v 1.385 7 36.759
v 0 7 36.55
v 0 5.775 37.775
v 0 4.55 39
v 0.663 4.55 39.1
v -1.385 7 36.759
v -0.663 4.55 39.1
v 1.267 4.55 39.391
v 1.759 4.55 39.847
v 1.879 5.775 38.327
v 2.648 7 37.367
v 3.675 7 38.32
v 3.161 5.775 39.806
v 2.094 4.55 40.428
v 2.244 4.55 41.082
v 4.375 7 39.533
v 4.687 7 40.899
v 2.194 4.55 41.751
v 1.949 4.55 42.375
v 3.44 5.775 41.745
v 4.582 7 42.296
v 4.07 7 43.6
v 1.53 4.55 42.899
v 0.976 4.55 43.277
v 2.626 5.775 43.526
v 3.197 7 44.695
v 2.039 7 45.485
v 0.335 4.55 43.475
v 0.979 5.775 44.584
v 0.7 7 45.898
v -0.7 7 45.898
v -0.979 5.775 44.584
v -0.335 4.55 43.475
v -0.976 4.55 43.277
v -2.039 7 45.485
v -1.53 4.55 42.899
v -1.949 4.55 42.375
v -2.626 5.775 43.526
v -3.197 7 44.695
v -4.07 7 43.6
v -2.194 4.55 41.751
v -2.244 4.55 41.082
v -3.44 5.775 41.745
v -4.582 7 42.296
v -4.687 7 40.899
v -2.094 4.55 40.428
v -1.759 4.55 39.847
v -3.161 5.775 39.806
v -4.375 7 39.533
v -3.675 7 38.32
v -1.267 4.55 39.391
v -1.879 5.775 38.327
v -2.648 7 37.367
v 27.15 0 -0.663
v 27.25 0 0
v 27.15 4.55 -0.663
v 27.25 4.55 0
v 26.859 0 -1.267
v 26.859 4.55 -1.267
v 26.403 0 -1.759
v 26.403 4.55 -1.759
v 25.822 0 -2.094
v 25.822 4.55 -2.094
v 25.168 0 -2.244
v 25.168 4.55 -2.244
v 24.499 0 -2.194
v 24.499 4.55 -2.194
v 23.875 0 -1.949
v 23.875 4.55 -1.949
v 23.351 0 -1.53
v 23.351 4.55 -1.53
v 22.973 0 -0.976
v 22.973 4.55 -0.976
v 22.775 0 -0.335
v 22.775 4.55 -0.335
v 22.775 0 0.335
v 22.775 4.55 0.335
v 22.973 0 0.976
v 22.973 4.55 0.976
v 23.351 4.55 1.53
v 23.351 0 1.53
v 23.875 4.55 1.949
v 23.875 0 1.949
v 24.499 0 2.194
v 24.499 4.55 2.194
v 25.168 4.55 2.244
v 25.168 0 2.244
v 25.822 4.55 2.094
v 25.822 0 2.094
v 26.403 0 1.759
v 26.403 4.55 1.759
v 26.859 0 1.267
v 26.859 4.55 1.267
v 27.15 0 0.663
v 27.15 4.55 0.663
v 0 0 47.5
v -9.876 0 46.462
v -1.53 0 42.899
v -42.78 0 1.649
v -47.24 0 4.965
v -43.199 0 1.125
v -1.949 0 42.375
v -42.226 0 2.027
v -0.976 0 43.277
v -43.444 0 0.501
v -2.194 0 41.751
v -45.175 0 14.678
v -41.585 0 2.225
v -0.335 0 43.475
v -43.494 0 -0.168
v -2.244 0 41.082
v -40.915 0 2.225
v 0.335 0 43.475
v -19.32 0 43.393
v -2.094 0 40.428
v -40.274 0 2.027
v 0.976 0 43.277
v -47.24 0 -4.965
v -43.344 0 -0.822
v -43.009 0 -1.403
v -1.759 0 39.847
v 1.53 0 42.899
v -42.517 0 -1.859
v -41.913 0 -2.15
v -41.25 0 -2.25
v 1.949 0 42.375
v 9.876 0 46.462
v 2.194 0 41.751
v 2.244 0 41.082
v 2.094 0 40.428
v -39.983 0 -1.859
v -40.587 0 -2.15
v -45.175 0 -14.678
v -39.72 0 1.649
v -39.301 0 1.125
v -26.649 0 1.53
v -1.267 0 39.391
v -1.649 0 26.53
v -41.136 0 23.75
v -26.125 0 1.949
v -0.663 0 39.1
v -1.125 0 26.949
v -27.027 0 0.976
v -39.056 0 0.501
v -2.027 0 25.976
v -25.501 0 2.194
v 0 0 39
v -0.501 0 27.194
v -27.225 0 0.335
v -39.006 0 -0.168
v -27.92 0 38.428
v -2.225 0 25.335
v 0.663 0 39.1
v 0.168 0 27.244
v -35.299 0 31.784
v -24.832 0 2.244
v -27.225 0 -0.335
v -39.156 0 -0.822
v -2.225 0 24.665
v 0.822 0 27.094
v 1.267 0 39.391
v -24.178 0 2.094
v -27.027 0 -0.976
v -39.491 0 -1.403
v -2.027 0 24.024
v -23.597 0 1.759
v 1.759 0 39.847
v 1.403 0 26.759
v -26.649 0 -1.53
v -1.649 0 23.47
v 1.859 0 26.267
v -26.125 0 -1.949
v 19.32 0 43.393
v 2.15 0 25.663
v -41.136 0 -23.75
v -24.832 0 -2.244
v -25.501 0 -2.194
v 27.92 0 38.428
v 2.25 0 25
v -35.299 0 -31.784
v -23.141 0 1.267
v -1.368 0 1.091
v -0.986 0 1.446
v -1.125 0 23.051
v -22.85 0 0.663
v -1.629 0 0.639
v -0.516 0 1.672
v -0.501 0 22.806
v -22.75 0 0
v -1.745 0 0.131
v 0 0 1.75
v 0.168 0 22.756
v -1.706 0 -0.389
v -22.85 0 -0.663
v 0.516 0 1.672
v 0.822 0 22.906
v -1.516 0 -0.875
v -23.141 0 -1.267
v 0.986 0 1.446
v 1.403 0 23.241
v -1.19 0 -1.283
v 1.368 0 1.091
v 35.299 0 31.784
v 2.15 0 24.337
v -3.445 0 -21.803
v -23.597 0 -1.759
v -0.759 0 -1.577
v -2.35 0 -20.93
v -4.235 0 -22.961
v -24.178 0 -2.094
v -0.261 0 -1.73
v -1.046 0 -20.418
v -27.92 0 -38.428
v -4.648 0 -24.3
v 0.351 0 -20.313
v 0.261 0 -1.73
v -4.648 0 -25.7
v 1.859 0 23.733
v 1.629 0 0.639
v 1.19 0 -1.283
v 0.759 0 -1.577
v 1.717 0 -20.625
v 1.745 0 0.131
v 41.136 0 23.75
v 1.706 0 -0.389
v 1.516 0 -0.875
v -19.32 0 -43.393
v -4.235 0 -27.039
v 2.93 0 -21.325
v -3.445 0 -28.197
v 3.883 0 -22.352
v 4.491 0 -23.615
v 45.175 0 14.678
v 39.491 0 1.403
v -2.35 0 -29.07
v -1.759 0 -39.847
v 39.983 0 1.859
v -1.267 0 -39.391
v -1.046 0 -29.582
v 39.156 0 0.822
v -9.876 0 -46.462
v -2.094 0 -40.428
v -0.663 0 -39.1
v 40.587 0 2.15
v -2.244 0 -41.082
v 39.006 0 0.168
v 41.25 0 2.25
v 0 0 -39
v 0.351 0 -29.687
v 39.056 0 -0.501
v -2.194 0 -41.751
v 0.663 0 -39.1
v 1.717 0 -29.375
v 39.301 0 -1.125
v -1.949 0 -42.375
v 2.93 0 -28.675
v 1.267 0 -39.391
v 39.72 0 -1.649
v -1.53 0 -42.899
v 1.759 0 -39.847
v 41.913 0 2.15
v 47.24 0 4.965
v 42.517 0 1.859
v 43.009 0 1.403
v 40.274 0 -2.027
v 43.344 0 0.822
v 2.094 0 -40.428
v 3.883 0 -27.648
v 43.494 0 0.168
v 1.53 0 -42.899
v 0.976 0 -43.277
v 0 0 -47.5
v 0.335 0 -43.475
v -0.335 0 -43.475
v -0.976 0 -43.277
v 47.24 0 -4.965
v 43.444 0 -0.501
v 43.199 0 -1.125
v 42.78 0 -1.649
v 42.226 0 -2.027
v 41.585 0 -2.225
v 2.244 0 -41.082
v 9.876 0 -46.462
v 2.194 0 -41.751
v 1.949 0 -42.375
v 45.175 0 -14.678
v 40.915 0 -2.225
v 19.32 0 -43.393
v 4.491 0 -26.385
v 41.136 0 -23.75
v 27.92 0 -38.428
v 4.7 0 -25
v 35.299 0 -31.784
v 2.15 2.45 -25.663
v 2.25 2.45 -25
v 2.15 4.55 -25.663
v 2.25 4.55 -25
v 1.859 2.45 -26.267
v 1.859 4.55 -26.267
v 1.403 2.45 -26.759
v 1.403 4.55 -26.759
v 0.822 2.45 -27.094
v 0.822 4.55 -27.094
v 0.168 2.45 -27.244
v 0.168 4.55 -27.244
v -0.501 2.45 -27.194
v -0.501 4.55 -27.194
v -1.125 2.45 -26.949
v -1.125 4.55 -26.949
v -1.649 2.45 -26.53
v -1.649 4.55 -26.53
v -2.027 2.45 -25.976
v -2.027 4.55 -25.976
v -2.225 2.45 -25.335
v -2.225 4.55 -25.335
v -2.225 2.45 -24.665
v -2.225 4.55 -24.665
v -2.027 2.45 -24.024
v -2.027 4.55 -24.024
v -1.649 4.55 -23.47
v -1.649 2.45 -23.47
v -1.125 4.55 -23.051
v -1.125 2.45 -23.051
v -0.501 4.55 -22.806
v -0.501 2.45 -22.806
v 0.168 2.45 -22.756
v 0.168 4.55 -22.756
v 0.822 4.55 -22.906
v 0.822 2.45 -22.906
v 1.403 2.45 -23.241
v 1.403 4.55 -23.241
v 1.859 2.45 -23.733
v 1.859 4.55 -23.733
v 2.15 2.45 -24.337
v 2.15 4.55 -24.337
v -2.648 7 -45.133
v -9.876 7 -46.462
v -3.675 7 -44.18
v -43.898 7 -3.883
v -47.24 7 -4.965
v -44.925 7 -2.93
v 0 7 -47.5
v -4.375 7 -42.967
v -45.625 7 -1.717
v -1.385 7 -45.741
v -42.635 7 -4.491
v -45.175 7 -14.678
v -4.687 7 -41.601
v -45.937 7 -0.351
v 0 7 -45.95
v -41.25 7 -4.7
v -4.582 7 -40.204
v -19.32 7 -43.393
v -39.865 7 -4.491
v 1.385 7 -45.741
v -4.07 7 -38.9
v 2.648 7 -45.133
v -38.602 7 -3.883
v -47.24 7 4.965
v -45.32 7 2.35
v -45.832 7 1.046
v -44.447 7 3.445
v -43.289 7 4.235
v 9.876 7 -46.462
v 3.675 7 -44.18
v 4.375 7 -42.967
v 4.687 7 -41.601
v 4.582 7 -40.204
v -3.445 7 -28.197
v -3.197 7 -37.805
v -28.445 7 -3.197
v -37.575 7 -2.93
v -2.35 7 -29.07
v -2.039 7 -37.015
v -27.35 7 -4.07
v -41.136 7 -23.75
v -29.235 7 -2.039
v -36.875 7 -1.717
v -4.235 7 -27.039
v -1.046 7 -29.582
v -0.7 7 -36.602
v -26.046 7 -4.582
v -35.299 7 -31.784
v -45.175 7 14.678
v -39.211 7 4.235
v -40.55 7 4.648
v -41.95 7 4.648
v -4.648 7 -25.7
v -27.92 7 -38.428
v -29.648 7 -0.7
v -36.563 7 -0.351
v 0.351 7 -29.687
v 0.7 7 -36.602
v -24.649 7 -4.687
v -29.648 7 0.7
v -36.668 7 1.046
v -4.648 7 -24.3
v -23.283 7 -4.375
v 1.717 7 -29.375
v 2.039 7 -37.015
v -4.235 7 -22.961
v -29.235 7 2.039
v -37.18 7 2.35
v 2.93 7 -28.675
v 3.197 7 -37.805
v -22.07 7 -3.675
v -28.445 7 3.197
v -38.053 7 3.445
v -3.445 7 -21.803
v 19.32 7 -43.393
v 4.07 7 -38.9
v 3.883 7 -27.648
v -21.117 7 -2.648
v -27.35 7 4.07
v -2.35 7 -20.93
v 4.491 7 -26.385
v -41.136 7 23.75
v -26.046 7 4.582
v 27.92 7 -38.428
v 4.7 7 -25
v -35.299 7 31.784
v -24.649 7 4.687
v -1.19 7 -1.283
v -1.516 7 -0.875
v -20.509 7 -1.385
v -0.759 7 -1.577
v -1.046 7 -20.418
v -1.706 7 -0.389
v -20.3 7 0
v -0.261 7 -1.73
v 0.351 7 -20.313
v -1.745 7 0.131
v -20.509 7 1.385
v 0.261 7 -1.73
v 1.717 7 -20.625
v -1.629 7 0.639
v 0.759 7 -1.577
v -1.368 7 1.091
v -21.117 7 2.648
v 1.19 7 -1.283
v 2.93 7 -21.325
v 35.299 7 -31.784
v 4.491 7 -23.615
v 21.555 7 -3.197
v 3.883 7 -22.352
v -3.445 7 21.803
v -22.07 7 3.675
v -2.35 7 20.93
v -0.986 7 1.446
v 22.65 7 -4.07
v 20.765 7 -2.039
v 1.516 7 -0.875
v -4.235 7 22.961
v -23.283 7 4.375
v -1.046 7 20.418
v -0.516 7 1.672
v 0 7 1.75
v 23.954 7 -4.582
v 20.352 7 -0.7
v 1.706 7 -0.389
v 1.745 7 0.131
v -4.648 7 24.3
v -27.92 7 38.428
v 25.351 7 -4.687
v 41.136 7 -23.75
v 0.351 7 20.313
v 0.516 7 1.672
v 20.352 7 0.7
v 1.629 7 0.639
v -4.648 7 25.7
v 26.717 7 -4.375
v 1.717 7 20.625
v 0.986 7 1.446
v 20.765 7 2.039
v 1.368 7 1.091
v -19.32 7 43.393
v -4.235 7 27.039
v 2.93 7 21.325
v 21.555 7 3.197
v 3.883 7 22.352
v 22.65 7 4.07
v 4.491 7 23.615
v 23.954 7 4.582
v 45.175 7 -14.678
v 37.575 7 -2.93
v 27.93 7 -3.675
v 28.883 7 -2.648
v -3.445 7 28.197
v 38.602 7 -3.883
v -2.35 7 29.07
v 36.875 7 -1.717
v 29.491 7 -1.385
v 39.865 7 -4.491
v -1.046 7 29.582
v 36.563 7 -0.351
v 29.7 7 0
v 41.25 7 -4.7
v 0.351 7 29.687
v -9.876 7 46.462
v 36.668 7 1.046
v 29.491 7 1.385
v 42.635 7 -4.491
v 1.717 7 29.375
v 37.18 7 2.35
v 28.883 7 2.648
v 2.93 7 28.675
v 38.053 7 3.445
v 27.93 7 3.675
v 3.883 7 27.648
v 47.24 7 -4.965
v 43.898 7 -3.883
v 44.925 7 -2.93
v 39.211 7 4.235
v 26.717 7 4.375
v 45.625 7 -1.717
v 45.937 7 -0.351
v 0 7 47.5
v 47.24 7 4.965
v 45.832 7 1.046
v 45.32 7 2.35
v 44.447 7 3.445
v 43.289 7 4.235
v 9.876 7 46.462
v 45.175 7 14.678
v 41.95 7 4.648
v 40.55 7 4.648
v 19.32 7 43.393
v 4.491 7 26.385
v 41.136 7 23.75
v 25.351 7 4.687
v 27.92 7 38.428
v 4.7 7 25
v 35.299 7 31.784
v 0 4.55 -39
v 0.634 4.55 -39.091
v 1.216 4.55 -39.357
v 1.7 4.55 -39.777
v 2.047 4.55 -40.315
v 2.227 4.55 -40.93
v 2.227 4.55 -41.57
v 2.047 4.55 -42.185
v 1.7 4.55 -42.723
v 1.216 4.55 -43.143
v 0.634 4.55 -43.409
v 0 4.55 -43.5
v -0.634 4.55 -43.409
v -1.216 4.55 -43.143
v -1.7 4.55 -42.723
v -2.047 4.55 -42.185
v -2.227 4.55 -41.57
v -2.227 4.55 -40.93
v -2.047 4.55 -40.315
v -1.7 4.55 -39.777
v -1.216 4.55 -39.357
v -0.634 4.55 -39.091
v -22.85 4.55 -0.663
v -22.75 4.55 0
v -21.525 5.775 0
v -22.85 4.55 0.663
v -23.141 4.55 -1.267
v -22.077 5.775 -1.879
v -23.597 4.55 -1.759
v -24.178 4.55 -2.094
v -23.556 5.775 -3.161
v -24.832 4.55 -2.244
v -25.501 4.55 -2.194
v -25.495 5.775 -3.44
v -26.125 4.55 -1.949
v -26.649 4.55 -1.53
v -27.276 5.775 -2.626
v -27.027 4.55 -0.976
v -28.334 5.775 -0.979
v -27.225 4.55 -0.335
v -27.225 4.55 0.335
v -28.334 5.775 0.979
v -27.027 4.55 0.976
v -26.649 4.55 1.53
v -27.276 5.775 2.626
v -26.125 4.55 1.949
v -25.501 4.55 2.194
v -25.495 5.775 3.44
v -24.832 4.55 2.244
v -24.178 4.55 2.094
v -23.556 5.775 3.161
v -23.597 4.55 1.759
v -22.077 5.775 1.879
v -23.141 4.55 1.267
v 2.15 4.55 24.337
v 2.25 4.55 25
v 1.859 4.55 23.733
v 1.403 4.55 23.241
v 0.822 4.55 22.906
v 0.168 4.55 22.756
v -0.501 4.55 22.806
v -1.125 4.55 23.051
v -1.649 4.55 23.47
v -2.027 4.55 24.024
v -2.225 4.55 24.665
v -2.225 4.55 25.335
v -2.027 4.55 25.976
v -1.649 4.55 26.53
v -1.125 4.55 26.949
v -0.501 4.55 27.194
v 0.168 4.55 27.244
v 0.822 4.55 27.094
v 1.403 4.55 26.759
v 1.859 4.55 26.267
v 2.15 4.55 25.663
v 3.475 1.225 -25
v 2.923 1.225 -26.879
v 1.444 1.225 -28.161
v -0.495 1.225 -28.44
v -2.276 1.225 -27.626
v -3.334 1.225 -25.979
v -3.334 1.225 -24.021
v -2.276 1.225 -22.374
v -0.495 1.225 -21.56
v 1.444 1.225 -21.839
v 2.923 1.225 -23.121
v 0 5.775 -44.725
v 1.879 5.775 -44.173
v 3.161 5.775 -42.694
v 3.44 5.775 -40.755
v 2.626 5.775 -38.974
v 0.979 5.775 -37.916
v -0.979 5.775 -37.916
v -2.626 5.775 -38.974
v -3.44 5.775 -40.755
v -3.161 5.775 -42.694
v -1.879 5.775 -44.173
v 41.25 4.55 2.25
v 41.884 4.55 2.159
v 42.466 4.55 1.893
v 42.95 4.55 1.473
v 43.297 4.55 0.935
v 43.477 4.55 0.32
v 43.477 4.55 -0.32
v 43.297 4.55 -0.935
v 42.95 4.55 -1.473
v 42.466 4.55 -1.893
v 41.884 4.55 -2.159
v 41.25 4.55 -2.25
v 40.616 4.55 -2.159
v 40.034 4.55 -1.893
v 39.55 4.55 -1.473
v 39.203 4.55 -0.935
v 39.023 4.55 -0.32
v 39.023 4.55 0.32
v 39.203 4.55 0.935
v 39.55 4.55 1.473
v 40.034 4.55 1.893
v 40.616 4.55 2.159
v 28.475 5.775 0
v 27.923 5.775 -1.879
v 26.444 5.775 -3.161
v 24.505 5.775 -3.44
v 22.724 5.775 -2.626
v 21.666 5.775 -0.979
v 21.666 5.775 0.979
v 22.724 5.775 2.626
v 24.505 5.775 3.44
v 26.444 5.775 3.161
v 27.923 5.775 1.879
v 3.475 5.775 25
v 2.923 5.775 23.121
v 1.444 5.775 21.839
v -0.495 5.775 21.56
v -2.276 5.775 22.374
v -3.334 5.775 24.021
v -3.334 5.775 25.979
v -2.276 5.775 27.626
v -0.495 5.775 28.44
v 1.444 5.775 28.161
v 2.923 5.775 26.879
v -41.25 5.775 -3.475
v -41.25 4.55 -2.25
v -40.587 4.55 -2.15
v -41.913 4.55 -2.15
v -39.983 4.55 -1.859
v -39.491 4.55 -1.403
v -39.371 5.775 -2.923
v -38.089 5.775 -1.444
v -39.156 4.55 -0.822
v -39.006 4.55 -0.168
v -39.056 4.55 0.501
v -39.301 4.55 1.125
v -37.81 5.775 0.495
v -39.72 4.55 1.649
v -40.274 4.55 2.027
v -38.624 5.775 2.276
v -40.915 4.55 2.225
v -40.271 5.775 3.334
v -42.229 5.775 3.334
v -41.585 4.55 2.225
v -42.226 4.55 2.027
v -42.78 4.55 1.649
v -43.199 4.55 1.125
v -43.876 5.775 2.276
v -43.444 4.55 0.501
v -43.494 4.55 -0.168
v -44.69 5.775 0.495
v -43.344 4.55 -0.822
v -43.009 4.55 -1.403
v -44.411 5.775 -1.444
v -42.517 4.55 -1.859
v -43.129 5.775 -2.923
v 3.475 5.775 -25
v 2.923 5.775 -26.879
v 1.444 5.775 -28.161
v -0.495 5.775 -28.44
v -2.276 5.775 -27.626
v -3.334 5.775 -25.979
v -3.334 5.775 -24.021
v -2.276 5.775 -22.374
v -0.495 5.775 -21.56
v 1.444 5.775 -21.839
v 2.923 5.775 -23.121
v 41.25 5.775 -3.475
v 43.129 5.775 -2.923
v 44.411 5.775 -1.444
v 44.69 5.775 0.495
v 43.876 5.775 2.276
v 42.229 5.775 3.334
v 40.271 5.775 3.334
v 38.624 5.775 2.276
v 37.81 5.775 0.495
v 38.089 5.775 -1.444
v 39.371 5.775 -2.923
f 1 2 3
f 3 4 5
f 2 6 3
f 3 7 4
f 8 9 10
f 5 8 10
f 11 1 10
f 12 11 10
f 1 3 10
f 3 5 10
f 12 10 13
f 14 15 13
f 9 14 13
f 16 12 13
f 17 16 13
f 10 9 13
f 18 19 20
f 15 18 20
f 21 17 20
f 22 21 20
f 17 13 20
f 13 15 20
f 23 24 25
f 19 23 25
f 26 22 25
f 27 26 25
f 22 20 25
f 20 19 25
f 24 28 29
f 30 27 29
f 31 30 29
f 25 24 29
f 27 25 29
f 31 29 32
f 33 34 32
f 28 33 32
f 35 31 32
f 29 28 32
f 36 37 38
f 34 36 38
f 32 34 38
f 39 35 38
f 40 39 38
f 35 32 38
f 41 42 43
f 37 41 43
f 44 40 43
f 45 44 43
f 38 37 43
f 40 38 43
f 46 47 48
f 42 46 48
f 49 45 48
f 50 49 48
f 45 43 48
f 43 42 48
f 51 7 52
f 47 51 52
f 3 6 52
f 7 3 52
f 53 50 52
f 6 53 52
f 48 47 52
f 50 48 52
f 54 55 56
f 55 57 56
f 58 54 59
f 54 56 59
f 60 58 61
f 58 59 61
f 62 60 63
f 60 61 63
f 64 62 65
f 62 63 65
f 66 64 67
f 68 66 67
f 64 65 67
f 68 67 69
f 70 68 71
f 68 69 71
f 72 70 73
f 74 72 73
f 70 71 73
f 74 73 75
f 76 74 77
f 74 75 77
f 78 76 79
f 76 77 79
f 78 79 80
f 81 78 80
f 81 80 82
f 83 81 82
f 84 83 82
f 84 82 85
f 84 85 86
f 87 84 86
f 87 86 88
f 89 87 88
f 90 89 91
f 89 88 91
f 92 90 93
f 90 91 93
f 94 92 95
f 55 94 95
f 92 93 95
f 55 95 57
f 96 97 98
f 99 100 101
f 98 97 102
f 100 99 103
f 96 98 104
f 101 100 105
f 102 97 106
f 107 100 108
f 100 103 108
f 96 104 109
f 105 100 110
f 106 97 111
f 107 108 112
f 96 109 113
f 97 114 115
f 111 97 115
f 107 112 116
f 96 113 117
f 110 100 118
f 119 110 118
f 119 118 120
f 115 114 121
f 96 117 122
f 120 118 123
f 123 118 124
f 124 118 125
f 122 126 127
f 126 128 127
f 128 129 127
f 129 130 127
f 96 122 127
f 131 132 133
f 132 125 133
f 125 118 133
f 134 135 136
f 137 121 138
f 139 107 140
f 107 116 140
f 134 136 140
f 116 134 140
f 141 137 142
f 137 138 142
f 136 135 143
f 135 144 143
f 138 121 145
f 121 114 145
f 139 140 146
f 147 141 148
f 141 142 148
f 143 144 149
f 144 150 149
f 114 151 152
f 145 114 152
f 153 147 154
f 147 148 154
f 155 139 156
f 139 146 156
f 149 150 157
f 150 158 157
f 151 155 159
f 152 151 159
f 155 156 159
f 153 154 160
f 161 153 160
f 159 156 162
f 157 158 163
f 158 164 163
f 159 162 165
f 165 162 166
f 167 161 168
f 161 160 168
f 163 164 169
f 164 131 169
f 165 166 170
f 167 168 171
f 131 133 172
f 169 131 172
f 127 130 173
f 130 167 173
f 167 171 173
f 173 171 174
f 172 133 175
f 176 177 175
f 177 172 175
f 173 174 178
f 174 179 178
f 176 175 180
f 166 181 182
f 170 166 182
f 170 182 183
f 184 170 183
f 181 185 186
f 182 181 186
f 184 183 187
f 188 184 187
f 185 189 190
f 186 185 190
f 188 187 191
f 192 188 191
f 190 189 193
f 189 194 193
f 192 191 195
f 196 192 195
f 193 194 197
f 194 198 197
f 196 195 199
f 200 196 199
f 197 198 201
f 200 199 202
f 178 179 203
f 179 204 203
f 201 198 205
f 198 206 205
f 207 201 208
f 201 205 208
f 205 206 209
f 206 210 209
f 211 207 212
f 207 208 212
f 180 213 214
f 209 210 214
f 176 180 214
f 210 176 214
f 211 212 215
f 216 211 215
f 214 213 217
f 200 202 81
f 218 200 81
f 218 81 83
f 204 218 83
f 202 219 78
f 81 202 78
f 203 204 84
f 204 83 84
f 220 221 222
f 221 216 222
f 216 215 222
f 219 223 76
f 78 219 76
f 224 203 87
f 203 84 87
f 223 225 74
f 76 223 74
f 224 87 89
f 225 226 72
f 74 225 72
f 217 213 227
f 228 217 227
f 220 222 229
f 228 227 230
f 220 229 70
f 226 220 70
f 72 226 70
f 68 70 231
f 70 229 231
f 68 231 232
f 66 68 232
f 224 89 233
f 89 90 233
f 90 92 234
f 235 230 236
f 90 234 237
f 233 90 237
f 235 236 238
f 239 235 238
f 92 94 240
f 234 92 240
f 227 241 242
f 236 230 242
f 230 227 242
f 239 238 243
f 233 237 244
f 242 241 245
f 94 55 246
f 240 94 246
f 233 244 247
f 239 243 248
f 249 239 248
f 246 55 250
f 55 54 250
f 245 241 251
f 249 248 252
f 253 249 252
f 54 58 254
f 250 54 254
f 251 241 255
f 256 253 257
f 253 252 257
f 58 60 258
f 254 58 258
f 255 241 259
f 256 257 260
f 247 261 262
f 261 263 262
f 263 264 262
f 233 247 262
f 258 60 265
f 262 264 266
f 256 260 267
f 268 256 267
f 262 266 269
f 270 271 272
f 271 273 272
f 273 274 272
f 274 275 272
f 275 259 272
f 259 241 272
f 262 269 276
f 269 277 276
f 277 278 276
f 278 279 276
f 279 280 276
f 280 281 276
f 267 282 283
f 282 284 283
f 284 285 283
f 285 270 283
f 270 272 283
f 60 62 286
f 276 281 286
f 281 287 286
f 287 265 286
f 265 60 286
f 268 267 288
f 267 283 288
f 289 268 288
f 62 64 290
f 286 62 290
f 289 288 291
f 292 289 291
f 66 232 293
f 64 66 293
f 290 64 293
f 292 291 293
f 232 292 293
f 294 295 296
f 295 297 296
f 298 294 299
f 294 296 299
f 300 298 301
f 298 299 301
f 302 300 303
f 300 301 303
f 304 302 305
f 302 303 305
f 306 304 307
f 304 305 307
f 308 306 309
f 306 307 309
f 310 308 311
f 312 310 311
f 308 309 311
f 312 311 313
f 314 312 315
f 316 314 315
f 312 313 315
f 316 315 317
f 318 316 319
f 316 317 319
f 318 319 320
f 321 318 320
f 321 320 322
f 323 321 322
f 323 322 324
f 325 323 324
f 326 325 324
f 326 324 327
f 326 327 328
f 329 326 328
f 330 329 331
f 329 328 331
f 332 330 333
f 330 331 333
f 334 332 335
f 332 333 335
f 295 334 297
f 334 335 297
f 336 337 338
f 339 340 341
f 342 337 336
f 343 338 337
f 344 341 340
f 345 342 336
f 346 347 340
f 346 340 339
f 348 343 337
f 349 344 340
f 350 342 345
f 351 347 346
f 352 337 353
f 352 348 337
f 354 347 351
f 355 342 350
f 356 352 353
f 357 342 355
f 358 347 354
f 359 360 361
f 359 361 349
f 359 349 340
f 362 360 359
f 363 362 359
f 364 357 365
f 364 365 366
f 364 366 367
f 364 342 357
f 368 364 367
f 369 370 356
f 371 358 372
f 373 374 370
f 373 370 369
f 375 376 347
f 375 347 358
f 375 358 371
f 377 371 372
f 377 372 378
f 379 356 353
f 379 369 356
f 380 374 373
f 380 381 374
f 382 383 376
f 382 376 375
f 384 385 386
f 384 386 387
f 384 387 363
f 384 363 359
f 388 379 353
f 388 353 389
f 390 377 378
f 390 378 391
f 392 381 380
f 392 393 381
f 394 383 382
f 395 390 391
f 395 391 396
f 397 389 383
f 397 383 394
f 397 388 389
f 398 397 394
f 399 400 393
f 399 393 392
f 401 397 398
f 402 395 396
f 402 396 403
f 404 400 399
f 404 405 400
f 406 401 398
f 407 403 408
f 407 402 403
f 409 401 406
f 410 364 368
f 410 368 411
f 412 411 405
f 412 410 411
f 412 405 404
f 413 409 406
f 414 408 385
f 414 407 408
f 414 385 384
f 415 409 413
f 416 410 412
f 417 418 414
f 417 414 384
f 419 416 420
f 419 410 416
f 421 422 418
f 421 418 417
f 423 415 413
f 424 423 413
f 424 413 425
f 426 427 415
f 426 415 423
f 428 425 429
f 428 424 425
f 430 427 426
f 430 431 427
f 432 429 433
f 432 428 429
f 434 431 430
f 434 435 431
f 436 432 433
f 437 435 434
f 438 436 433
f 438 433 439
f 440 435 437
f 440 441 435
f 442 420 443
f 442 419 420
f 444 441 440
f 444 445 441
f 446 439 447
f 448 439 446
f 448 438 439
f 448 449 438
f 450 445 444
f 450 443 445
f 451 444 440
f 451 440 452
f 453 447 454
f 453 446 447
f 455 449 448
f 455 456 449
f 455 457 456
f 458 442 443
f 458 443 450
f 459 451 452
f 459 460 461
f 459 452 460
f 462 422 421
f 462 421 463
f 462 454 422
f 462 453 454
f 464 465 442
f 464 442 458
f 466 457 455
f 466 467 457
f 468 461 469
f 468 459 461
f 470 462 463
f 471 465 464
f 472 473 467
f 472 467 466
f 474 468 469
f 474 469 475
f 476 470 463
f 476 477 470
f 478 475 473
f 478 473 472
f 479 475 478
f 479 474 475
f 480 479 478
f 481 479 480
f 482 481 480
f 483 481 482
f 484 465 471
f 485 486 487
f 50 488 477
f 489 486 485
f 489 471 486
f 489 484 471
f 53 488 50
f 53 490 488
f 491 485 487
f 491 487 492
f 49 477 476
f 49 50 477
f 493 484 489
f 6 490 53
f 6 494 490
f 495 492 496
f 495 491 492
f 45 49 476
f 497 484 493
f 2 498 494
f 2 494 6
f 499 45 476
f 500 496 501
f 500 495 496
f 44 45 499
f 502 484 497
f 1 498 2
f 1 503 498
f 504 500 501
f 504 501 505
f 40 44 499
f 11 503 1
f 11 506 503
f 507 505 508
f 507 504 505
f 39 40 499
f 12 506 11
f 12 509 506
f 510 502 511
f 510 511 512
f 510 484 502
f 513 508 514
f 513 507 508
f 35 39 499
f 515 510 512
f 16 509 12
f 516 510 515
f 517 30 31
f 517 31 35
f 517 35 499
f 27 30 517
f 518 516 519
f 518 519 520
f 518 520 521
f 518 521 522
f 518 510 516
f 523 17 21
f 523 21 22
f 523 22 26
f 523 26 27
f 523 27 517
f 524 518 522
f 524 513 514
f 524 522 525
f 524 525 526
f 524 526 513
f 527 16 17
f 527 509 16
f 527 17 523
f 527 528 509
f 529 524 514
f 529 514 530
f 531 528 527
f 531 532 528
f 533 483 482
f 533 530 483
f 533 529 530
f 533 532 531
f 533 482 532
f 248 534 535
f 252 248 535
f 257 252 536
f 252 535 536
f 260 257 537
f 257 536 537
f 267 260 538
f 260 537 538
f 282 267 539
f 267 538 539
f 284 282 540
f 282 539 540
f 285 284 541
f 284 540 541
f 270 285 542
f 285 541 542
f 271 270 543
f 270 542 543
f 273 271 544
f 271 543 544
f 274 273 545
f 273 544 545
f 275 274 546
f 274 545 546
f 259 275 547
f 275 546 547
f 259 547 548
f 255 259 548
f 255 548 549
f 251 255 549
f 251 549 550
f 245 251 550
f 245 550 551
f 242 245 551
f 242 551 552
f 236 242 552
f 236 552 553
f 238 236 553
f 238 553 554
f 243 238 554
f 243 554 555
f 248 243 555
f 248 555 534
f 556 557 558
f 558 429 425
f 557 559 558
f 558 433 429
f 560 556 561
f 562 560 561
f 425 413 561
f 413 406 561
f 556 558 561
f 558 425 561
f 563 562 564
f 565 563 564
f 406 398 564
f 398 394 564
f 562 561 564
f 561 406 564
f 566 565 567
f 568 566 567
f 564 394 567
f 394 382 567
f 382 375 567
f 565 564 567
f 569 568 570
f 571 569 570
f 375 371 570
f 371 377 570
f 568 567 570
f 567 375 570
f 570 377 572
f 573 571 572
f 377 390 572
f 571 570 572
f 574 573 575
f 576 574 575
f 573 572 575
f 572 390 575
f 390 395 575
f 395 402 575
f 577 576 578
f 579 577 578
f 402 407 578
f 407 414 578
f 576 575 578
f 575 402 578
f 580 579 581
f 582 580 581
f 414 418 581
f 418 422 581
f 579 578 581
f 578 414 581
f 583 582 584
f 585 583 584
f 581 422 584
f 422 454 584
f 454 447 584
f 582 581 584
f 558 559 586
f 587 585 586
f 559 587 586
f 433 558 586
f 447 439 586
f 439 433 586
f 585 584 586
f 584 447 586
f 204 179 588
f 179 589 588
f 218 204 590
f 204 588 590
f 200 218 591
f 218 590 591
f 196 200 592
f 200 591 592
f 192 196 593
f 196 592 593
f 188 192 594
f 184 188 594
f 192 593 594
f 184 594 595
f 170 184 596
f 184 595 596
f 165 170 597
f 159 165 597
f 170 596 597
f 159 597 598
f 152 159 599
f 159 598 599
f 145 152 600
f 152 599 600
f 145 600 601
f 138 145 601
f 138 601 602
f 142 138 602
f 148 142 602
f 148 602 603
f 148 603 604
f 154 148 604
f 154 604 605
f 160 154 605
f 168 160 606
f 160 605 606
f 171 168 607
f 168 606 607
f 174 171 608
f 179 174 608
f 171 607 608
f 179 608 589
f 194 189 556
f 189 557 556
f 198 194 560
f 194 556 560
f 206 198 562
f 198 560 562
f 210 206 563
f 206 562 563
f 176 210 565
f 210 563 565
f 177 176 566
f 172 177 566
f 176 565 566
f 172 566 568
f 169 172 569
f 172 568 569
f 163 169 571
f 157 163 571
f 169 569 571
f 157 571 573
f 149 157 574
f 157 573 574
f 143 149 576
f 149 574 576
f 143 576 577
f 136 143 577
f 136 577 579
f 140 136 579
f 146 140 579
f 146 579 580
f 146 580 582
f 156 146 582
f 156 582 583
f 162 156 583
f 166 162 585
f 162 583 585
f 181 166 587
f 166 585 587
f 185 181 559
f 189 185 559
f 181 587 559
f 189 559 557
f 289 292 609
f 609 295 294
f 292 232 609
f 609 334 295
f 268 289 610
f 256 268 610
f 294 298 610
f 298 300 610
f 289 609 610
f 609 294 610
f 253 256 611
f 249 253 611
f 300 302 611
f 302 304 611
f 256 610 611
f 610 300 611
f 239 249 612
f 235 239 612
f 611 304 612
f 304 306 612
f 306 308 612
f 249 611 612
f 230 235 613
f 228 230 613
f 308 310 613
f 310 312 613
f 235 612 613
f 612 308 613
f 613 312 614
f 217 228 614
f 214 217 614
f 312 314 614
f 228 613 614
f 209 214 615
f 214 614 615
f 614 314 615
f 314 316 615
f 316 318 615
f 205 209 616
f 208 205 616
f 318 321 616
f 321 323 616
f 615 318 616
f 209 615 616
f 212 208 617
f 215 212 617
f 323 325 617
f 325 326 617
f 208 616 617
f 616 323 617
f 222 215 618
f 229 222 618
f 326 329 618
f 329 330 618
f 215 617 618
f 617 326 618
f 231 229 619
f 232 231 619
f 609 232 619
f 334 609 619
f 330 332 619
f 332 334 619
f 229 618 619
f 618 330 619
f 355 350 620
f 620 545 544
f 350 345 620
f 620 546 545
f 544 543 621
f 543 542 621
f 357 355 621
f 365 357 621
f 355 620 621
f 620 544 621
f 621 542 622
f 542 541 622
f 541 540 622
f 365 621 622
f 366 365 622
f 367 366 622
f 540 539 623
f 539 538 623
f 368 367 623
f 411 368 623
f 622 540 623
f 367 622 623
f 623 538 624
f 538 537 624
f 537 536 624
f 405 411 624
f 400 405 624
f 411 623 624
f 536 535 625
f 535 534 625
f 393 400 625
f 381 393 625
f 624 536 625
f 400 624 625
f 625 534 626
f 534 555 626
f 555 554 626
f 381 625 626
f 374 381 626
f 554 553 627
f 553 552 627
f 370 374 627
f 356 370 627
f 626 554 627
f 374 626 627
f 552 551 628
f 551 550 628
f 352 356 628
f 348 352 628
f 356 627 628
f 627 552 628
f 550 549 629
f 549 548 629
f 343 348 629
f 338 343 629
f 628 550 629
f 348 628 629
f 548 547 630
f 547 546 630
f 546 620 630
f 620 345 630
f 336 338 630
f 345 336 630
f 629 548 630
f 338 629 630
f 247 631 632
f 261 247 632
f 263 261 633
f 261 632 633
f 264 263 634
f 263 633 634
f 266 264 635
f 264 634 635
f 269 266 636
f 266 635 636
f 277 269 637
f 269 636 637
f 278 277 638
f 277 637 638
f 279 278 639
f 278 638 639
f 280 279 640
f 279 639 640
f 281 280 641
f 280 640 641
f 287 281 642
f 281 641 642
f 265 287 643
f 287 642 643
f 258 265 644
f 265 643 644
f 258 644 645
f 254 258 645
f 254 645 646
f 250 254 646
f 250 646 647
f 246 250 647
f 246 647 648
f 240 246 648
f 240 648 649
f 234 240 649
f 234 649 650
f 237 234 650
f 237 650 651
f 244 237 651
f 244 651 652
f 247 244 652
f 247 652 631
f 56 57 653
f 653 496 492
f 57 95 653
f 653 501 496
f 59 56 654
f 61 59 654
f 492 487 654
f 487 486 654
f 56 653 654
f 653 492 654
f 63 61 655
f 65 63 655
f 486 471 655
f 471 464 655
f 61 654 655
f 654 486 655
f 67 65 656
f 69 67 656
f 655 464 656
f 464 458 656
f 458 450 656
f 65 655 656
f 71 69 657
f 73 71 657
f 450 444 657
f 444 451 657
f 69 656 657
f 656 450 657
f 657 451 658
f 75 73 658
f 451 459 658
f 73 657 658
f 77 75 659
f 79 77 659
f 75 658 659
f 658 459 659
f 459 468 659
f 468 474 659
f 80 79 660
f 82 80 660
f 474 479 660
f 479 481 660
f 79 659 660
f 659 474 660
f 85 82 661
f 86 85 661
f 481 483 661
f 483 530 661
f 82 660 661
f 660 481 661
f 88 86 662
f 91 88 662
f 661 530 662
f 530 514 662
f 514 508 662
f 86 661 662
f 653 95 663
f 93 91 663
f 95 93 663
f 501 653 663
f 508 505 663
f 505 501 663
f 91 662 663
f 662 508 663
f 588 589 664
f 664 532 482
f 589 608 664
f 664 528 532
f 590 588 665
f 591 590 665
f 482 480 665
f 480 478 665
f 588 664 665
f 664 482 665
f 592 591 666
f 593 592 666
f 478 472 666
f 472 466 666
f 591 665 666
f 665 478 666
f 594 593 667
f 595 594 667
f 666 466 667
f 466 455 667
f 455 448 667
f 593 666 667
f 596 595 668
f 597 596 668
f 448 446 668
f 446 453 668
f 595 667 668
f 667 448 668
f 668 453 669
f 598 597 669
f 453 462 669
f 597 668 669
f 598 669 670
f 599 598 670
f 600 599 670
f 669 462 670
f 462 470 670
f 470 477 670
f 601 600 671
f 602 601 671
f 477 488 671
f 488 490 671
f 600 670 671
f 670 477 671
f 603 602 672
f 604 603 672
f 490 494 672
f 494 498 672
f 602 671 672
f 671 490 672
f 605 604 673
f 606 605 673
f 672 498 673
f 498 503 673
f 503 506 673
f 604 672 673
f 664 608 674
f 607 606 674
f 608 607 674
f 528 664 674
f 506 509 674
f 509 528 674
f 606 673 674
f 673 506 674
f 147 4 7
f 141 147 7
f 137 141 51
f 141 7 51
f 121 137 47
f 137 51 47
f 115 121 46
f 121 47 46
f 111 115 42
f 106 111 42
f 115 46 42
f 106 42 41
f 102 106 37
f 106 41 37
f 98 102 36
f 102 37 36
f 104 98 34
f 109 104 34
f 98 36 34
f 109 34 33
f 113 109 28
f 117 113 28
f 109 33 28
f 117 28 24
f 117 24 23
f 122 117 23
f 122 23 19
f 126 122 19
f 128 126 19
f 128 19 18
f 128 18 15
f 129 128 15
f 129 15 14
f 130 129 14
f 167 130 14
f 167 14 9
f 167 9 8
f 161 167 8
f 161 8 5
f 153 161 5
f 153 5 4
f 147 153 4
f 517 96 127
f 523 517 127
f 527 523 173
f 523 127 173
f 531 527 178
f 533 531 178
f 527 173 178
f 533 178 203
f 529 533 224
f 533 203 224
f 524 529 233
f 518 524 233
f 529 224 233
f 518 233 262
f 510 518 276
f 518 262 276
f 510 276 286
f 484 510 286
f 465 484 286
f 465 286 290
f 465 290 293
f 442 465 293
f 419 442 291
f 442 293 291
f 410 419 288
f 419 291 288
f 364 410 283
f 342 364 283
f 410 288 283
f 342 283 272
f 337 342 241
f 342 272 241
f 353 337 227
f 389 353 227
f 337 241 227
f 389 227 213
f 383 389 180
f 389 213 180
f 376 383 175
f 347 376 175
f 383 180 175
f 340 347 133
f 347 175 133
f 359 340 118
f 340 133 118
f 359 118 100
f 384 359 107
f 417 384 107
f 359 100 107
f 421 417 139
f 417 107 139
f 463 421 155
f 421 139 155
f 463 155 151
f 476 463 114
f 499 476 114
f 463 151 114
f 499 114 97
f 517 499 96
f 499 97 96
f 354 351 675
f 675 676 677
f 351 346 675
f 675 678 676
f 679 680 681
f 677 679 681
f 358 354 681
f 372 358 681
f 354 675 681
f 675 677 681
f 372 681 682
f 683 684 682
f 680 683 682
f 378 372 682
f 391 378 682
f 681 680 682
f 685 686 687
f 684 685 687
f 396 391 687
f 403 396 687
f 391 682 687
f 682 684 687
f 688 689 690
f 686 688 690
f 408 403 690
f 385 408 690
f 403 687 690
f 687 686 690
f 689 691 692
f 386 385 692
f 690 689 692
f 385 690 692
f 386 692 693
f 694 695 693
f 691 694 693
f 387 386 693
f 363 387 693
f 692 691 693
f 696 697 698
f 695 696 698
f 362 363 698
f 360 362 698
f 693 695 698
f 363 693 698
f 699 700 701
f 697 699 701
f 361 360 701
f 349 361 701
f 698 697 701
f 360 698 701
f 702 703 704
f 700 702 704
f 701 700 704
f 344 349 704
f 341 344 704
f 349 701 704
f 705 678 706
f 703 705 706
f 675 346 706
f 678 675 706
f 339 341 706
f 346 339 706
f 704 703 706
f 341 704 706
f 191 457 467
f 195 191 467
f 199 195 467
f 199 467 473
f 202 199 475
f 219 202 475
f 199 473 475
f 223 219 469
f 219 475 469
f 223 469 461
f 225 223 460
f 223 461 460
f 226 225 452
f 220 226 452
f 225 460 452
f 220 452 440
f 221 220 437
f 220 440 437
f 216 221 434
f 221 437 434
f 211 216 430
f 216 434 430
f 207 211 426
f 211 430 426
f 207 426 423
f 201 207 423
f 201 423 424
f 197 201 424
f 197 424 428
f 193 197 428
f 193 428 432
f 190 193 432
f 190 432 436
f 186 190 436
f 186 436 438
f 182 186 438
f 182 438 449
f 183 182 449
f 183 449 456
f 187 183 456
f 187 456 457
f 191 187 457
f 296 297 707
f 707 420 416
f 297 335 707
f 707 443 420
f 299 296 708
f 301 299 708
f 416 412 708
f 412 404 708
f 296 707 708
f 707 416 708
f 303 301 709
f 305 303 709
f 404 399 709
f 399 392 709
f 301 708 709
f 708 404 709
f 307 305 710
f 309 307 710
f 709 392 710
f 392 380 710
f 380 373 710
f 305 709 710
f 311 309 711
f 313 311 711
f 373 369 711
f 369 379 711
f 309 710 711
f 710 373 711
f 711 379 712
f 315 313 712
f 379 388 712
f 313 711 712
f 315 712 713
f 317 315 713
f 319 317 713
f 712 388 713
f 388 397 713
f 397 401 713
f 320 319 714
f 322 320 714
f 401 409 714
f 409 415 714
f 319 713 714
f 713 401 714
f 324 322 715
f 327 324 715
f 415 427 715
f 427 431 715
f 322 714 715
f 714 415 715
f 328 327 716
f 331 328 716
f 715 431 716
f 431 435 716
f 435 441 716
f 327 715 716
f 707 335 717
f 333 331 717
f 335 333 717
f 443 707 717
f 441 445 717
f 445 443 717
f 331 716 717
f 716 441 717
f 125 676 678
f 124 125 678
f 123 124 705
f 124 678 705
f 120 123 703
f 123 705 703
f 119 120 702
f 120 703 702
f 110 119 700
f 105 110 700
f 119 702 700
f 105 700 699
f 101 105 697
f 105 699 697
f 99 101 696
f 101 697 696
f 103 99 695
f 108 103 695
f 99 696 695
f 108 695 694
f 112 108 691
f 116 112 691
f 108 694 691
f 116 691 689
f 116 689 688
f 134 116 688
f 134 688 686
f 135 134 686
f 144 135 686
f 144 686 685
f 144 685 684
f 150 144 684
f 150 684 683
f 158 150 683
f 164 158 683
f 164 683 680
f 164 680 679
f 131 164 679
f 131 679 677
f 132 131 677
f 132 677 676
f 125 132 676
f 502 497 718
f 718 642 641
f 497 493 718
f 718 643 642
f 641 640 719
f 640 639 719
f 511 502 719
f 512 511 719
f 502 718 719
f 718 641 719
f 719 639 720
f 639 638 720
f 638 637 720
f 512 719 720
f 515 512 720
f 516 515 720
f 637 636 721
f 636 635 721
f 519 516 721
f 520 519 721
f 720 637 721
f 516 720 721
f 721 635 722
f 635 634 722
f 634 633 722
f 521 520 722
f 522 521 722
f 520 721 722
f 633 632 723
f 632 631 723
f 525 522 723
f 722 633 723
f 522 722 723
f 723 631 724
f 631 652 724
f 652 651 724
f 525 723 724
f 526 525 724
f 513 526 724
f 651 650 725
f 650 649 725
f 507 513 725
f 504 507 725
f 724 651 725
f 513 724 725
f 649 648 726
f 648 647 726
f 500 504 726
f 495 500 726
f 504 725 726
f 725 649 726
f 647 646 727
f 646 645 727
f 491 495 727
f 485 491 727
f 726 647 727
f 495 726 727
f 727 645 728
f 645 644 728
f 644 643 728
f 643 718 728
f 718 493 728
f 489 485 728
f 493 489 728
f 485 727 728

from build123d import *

# Parameters (mm, degrees)
SKETCH1_R                                           = 47.5
SKETCH1_R_2                                         = 35
BOSS_EXTRUDE1_DEPTH                                 = 7
SKETCH2_R                                           = 2.25
SKETCH2_R_2                                         = 1.75
CUT_EXTRUDE1_DEPTH                                  = 68.538877693
CSK_FOR_M4_COUNTERSUNK_FLAT_HEAD_SCREW1_D           = 4.5
CSK_FOR_M4_COUNTERSUNK_FLAT_HEAD_SCREW1_CSINK_D     = 9.4
CSK_FOR_M4_COUNTERSUNK_FLAT_HEAD_SCREW1_CSINK_ANGLE = 90
BOSS_EXTRUDE2_START                                 = -7
SKETCH4_R                                           = 35
BOSS_EXTRUDE2_DEPTH                                 = 7
SKETCH6_R                                           = 1.75
CUT_EXTRUDE2_DEPTH                                  = 30
SKETCH2_2_R                                         = 2.25
SKETCH2_2_R_2                                       = 1.75
CUT_EXTRUDE3_DEPTH                                  = 68.538877693


# Read off the part's stored shape, not the designer's step: CSK for M4 Countersunk Flat Head Screw2
with BuildPart() as part:
    # Sketch1 → Boss-Extrude1 (new body)
    with BuildSketch(Plane(origin=(0, 0, 0), x_dir=(1, 0, 0), z_dir=(0, 1, 0))):
        with Locations(Location((0, 0, 0), (0, 0, 270))):
            Circle(SKETCH1_R)
        with Locations(Location((0, 0, 0), (0, 0, 270))):
            Circle(SKETCH1_R_2, mode=Mode.SUBTRACT)
    extrude(amount=BOSS_EXTRUDE1_DEPTH)

    # Sketch2 → Cut-Extrude1 (cut, through all)
    with BuildSketch(Plane(origin=(0, 7, 0), x_dir=(1, 0, 0), z_dir=(0, 1, 0))):
        with Locations(Location((0, 41.25, 0), (0, 0, 270))):
            Circle(SKETCH2_R)
        with Locations(Location((41.25, 0, 0), (0, 0, 270))):
            Circle(SKETCH2_R)
        with Locations(Location((0, -41.25, 0), (0, 0, 90))):
            Circle(SKETCH2_R)
        with Locations(Location((-41.25, 0, 0), (0, 0, 90))):
            Circle(SKETCH2_R)
        with Locations((0, 25)):
            Circle(SKETCH2_R_2)
        with Locations((25, 0)):
            Circle(SKETCH2_R_2)
        with Locations((0, -25)):
            Circle(SKETCH2_R_2)
        with Locations((-25, 0)):
            Circle(SKETCH2_R_2)
    extrude(amount=-CUT_EXTRUDE1_DEPTH, mode=Mode.SUBTRACT)

    # CSK for M4 Countersunk Flat Head Screw1 (through all)
    with Locations(Plane(origin=(0, 7, 41.25), x_dir=(0, 0, 1), z_dir=(0, 1, 0))):
        with Locations((0, 0), (-41.25, 41.25), (-82.5, 0), (-41.25, -41.25)):
            CounterSinkHole(CSK_FOR_M4_COUNTERSUNK_FLAT_HEAD_SCREW1_D / 2, CSK_FOR_M4_COUNTERSUNK_FLAT_HEAD_SCREW1_CSINK_D / 2, counter_sink_angle=CSK_FOR_M4_COUNTERSUNK_FLAT_HEAD_SCREW1_CSINK_ANGLE)

    # Sketch4 → Boss-Extrude2 (add)
    with BuildSketch(Plane(origin=(0, 7, 0), x_dir=(1, 0, 0), z_dir=(0, 1, 0)).offset(BOSS_EXTRUDE2_START)):
        Circle(SKETCH4_R)
    extrude(amount=BOSS_EXTRUDE2_DEPTH)

    # Sketch6 → Cut-Extrude2 (cut)
    with BuildSketch(Plane(origin=(0, 7, 0), x_dir=(1, 0, 0), z_dir=(0, 1, 0))):
        with Locations(Location((0, 0, 0), (0, 0, 270))):
            Circle(SKETCH6_R)
    extrude(amount=-CUT_EXTRUDE2_DEPTH, mode=Mode.SUBTRACT)

    # Sketch2<2> → Cut-Extrude3 (cut, through all)
    with BuildSketch(Plane(origin=(0, 7, 0), x_dir=(1, 0, 0), z_dir=(0, 1, 0))):
        with Locations(Location((0, 41.25, 0), (0, 0, 270))):
            Circle(SKETCH2_2_R)
        with Locations(Location((41.25, 0, 0), (0, 0, 270))):
            Circle(SKETCH2_2_R)
        with Locations(Location((0, -41.25, 0), (0, 0, 270))):
            Circle(SKETCH2_2_R)
        with Locations(Location((-41.25, 0, 0), (0, 0, 270))):
            Circle(SKETCH2_2_R)
        with Locations(Location((0, 25, 0), (0, 0, 270))):
            Circle(SKETCH2_2_R_2)
        with Locations(Location((25, 0, 0), (0, 0, 270))):
            Circle(SKETCH2_2_R_2)
        with Locations(Location((0, -25, 0), (0, 0, 270))):
            Circle(SKETCH2_2_R_2)
        with Locations(Location((-25, 0, 0), (0, 0, 270))):
            Circle(SKETCH2_2_R_2)
    extrude(amount=-CUT_EXTRUDE3_DEPTH, mode=Mode.SUBTRACT)

    # CSK for M4 Countersunk Flat Head Scr 2 → CSK for M4 Countersunk Flat Head Screw2 (revolve, cut)
    with BuildSketch(Plane.XY.offset(-25)):
        Polygon((1.75, 0), (4.7, 0), (2.25, 2.45), (2.25, 4.55), (4.7, 7), (1.75, 7), align=None)
    revolve(axis=Axis((0, 0, -25), (0, 1, 0)), mode=Mode.SUBTRACT)

    # CSK for M4 Countersunk Flat Head Scr 3 o → CSK for M4 Countersunk Flat Head Scr 3 (revolve, cut)
    with BuildSketch(Plane(origin=(25, 0, 0), x_dir=(1, 0, 0), z_dir=(0, 0, 1))):
        Polygon((1.75, 0), (2.25, 0), (2.25, 4.55), (4.7, 7), (1.75, 7), align=None)
    revolve(axis=Axis((25, 0, 0), (0, 1, 0)), mode=Mode.SUBTRACT)

    # CSK for M4 Countersunk Flat Head Scr 4 o → CSK for M4 Countersunk Flat Head Scr 4 (revolve, cut)
    with BuildSketch(Plane.XY.offset(25)):
        Polygon((1.75, 0), (2.25, 0), (2.25, 4.55), (4.7, 7), (1.75, 7), align=None)
    revolve(axis=Axis((0, 0, 25), (0, 1, 0)), mode=Mode.SUBTRACT)

    # CSK for M4 Countersunk Flat Head Scr 5 o → CSK for M4 Countersunk Flat Head Scr 5 (revolve, cut)
    with BuildSketch(Plane(origin=(-25, 0, 0), x_dir=(1, 0, 0), z_dir=(0, 0, 1))):
        Polygon((1.75, 0), (2.25, 0), (2.25, 4.55), (4.7, 7), (1.75, 7), align=None)
    revolve(axis=Axis((-25, 0, 0), (0, 1, 0)), mode=Mode.SUBTRACT)


solid = part.part
